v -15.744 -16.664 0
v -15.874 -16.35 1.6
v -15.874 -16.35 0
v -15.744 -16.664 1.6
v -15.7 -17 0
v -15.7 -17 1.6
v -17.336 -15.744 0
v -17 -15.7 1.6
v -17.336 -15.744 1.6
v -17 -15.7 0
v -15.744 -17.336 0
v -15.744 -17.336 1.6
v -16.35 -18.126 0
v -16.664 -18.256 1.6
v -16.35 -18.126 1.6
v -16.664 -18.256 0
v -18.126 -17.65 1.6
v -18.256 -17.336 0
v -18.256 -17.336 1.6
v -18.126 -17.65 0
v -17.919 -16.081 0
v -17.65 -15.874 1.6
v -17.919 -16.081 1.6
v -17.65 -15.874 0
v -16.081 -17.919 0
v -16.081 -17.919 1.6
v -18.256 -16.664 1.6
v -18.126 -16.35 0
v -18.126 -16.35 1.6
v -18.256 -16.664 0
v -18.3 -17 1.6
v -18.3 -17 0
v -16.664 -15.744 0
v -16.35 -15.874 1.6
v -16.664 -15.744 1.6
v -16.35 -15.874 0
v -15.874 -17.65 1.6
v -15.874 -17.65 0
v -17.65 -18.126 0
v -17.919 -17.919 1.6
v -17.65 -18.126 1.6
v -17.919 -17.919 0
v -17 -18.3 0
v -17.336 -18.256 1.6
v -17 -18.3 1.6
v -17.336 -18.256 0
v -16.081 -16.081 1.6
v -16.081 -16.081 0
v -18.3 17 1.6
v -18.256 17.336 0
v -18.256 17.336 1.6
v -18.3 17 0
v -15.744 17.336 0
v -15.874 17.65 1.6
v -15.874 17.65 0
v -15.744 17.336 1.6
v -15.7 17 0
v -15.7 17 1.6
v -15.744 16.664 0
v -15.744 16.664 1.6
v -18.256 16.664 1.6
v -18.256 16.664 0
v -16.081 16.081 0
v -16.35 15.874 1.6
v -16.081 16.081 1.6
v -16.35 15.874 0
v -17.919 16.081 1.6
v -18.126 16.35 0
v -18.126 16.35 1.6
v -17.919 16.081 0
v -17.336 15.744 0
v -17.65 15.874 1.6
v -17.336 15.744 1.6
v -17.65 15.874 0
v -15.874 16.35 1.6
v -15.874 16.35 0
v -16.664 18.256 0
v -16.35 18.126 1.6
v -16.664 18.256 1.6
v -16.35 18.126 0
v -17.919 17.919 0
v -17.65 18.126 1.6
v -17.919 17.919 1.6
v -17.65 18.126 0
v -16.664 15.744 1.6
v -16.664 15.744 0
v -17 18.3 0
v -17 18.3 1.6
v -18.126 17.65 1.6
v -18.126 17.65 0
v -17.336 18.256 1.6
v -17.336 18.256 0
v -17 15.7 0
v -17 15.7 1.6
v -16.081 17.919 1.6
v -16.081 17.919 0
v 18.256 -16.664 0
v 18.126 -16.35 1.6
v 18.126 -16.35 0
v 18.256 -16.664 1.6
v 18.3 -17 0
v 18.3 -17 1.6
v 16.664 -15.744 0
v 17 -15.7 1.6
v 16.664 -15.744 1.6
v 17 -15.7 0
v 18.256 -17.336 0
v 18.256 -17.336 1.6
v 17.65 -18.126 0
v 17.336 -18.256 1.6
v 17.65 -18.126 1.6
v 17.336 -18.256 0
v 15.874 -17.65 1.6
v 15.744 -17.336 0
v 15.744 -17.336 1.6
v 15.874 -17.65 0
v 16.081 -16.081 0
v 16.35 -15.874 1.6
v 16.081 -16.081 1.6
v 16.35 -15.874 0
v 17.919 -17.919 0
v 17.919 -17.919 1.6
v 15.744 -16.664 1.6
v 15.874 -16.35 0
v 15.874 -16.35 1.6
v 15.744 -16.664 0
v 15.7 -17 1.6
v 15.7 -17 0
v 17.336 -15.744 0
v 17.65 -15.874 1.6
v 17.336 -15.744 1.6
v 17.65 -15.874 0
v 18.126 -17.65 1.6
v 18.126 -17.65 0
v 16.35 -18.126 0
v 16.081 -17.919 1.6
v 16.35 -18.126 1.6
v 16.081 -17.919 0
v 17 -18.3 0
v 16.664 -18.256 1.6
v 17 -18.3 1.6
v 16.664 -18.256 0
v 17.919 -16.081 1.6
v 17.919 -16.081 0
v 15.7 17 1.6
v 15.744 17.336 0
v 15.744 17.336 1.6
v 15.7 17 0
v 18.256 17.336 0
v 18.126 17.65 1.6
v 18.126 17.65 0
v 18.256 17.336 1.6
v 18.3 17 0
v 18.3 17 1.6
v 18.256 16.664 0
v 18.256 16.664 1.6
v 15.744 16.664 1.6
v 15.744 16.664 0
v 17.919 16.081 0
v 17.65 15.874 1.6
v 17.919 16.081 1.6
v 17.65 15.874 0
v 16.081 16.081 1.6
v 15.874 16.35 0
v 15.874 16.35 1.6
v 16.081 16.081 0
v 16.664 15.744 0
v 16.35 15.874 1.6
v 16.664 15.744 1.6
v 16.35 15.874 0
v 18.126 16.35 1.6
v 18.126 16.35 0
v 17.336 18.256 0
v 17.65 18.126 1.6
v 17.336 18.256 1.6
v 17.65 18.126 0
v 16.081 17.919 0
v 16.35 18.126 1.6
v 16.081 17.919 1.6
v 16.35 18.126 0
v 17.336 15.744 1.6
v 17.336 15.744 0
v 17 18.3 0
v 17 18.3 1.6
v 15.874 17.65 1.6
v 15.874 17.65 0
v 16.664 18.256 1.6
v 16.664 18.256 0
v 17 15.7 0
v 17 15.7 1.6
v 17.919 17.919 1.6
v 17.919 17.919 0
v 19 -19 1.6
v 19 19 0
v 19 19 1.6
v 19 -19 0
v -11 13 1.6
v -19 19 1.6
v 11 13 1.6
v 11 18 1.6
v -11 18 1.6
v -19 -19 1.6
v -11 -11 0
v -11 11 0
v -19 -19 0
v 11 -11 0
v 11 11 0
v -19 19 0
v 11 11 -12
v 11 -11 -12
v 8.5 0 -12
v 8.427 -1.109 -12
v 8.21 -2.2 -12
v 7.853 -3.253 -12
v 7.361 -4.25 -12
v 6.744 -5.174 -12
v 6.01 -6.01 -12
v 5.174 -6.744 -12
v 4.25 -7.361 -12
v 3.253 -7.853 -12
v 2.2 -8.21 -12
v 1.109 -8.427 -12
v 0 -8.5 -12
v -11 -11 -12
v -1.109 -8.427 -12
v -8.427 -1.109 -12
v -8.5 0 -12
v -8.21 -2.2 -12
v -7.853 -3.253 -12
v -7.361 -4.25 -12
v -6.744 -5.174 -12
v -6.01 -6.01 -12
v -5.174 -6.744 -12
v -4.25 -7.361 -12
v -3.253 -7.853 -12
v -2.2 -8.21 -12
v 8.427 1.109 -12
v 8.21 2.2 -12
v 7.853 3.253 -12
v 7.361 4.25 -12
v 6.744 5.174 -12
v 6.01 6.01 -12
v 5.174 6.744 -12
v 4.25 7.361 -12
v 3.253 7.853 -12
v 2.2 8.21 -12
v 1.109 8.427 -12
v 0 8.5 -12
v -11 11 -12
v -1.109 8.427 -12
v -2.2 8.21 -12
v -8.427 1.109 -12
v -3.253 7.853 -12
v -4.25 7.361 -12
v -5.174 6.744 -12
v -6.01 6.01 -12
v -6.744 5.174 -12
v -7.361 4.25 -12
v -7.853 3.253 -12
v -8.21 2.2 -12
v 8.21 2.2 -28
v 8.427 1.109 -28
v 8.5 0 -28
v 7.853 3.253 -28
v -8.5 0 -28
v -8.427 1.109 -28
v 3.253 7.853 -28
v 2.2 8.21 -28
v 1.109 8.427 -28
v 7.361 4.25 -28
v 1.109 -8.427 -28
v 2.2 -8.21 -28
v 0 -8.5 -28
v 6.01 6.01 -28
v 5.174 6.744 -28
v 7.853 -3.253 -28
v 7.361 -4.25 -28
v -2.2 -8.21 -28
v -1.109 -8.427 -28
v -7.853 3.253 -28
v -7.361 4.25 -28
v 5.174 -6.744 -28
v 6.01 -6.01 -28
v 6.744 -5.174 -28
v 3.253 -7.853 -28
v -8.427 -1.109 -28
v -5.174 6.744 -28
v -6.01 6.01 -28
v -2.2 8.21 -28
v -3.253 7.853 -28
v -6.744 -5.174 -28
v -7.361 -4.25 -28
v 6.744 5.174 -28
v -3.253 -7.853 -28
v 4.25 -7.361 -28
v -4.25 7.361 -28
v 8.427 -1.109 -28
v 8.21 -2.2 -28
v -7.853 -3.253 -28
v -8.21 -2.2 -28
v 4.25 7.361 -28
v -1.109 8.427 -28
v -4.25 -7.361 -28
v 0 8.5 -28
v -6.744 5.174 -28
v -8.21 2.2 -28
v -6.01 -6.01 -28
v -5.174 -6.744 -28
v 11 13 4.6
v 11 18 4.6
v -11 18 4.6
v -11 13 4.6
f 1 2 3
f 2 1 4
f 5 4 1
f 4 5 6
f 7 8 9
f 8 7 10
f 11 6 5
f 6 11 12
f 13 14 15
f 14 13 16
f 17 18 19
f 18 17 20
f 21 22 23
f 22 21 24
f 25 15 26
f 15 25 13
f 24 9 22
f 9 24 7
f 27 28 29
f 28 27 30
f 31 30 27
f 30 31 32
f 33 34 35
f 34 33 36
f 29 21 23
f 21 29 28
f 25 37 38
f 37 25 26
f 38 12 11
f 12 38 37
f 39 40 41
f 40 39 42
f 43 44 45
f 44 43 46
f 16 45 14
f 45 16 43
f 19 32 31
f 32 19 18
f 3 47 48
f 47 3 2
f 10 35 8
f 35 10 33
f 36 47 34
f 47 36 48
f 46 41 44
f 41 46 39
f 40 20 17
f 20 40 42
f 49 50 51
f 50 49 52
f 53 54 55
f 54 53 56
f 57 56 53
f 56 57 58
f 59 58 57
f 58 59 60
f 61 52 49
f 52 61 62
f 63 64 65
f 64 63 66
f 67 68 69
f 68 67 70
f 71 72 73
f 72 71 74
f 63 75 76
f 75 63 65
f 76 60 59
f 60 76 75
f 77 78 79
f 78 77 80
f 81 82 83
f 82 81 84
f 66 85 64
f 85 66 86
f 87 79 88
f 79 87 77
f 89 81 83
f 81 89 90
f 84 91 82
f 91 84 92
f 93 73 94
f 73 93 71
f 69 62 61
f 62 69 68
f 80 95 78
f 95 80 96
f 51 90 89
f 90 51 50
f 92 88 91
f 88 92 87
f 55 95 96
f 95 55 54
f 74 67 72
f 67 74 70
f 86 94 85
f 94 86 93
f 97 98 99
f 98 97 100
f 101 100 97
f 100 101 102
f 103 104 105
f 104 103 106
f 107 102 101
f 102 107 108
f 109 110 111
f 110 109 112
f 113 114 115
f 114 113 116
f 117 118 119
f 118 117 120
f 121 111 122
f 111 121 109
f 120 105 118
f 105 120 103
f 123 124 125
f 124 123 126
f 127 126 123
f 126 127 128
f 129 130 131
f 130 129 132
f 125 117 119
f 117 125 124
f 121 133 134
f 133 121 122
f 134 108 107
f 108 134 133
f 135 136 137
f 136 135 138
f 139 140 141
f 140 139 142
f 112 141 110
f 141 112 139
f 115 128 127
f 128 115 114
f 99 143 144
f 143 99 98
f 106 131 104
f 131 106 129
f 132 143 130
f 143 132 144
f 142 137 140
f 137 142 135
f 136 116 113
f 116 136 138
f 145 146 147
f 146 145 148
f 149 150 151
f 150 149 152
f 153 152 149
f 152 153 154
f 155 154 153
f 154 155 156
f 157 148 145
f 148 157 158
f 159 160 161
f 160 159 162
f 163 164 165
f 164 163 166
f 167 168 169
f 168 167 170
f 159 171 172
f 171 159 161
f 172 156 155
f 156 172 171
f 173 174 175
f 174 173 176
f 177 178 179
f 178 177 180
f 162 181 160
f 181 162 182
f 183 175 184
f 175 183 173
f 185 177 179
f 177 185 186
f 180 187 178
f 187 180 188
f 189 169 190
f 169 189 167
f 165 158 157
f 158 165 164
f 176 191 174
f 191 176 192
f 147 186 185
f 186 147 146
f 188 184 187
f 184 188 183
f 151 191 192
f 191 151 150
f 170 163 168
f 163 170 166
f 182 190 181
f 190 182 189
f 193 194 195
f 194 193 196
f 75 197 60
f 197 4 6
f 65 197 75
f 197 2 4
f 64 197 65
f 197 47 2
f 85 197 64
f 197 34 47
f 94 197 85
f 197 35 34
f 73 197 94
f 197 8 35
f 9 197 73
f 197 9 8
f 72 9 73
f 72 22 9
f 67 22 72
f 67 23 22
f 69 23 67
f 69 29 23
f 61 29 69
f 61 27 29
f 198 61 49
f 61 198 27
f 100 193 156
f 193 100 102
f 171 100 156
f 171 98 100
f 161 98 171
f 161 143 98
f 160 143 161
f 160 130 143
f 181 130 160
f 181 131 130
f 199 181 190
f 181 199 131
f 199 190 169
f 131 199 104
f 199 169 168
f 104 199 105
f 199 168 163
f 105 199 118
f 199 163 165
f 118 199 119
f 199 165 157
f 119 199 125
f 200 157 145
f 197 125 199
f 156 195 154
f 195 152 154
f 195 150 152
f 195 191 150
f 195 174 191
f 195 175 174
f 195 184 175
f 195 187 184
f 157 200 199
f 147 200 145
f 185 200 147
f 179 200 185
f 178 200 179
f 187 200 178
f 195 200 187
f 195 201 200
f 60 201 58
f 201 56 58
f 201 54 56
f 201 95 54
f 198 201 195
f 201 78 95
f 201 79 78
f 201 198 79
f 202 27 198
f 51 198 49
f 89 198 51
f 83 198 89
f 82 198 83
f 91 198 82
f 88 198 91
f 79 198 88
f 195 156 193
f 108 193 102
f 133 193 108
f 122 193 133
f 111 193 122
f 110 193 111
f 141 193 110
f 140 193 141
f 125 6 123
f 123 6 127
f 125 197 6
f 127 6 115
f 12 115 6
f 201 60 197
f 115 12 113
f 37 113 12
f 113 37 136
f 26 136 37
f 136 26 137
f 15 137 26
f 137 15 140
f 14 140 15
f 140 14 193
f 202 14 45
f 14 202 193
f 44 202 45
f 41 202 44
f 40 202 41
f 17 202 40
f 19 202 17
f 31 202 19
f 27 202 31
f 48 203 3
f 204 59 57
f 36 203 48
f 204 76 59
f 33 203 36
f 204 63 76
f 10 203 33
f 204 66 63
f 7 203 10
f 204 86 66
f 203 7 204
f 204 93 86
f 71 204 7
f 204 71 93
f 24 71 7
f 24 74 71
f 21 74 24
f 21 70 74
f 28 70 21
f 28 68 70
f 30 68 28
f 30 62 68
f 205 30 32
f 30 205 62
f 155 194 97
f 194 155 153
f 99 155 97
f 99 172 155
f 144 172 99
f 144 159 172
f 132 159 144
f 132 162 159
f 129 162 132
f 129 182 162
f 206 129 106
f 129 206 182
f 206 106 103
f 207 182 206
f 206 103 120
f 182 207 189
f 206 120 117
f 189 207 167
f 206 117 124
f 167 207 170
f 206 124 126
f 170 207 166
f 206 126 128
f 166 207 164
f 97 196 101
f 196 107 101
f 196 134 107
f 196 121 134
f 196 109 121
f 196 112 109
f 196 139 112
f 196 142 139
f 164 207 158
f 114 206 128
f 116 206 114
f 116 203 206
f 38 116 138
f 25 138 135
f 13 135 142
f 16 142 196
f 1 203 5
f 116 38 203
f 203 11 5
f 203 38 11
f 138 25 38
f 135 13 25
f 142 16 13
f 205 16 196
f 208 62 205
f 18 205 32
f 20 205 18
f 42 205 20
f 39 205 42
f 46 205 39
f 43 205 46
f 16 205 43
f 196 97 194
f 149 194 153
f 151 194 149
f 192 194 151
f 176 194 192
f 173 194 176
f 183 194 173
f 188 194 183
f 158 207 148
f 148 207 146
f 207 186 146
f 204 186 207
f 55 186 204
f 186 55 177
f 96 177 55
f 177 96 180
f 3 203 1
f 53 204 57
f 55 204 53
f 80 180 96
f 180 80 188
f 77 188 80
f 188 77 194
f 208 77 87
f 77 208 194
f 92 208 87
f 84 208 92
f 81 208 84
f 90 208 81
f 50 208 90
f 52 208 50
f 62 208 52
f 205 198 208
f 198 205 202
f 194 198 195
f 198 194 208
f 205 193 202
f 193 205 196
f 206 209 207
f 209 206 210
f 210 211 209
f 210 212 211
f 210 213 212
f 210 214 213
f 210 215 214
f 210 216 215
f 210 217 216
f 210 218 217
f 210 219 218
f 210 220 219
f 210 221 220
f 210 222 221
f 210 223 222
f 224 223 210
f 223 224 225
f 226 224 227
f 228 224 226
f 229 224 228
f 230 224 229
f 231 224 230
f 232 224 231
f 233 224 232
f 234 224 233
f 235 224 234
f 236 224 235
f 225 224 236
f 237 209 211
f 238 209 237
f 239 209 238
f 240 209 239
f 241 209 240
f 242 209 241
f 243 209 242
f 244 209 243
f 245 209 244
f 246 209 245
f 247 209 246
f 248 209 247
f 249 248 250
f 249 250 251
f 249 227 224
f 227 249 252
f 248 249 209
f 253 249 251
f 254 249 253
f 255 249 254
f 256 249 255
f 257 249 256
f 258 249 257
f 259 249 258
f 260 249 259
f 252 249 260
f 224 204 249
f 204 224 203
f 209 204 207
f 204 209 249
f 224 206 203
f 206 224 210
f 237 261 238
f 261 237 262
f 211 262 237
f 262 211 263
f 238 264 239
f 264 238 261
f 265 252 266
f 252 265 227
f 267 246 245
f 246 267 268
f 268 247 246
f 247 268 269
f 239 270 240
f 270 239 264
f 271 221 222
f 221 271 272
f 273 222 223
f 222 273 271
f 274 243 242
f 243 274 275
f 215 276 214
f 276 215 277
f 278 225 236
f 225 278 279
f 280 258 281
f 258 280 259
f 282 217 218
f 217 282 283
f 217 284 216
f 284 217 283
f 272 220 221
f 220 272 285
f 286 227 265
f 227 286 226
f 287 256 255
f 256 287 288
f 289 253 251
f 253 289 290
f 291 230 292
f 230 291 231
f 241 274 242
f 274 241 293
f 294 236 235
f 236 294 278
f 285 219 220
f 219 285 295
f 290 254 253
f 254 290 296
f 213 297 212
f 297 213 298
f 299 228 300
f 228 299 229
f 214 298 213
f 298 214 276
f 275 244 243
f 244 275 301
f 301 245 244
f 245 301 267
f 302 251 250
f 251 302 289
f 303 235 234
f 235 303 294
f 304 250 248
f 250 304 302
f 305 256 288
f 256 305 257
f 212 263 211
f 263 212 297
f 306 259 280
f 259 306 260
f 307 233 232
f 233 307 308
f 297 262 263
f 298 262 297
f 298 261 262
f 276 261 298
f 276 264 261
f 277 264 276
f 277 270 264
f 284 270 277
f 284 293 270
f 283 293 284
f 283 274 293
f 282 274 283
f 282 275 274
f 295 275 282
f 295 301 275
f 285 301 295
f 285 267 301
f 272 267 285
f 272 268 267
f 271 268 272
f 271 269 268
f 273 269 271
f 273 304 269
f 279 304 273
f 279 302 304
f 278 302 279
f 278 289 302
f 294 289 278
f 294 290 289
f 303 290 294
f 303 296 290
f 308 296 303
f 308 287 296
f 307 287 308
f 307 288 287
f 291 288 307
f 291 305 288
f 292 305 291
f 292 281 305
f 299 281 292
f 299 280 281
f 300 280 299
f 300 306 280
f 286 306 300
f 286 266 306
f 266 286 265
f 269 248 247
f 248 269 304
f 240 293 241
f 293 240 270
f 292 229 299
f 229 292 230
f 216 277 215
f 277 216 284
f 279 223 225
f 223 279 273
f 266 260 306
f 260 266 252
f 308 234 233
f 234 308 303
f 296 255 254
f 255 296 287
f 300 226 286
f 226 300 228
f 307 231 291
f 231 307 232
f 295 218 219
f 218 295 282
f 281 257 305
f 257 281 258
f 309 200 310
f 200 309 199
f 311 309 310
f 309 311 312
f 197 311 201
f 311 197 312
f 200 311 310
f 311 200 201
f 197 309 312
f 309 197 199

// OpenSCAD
// =====================================================================
// gs_camera_m12.scad — RPi Global Shutter Camera + M12 4mm レンズ 簡易モデル
// 配置検討・アセンブリ用プレースホルダ。印刷対象ではない。
// パターン2 では箱底ビューポートへ「レンズ下向き」で使うため、
// 原点 = 基板下面中心 (0,0,0)、基板 +Z、レンズは -Z へ伸びる。
// 寸法は RPi 公称 38×38 + M12 レンズ仮値 (要実測)。
// =====================================================================

pcb_sq = 38;
pcb_t = 1.6;
hole_pitch = 34;    // 仮値 (要実測: 公式図面では 30? 要確認)
lens_d = 17;        // M12 レンズホルダ外径 (仮)
lens_l = 28;        // 基板下面からレンズ前面まで (仮)
mount_sq = 22;      // M12 ホルダ台座 (仮)

difference() {
    translate([-pcb_sq/2, -pcb_sq/2, 0]) cube([pcb_sq, pcb_sq, pcb_t]);
    for (x = [-hole_pitch/2, hole_pitch/2]) for (y = [-hole_pitch/2, hole_pitch/2])
        translate([x, y, -0.5]) cylinder(d=2.6, h=pcb_t + 1, $fn=24);
}
// M12 ホルダ台座 + レンズ (下向き)
translate([-mount_sq/2, -mount_sq/2, -12]) cube([mount_sq, mount_sq, 12]);
translate([0, 0, -lens_l]) cylinder(d=lens_d, h=lens_l - 12 + 0.1, $fn=48);
// CSI コネクタ (基板上面の縁)
translate([-11, pcb_sq/2 - 6, pcb_t]) cube([22, 5, 3]);
